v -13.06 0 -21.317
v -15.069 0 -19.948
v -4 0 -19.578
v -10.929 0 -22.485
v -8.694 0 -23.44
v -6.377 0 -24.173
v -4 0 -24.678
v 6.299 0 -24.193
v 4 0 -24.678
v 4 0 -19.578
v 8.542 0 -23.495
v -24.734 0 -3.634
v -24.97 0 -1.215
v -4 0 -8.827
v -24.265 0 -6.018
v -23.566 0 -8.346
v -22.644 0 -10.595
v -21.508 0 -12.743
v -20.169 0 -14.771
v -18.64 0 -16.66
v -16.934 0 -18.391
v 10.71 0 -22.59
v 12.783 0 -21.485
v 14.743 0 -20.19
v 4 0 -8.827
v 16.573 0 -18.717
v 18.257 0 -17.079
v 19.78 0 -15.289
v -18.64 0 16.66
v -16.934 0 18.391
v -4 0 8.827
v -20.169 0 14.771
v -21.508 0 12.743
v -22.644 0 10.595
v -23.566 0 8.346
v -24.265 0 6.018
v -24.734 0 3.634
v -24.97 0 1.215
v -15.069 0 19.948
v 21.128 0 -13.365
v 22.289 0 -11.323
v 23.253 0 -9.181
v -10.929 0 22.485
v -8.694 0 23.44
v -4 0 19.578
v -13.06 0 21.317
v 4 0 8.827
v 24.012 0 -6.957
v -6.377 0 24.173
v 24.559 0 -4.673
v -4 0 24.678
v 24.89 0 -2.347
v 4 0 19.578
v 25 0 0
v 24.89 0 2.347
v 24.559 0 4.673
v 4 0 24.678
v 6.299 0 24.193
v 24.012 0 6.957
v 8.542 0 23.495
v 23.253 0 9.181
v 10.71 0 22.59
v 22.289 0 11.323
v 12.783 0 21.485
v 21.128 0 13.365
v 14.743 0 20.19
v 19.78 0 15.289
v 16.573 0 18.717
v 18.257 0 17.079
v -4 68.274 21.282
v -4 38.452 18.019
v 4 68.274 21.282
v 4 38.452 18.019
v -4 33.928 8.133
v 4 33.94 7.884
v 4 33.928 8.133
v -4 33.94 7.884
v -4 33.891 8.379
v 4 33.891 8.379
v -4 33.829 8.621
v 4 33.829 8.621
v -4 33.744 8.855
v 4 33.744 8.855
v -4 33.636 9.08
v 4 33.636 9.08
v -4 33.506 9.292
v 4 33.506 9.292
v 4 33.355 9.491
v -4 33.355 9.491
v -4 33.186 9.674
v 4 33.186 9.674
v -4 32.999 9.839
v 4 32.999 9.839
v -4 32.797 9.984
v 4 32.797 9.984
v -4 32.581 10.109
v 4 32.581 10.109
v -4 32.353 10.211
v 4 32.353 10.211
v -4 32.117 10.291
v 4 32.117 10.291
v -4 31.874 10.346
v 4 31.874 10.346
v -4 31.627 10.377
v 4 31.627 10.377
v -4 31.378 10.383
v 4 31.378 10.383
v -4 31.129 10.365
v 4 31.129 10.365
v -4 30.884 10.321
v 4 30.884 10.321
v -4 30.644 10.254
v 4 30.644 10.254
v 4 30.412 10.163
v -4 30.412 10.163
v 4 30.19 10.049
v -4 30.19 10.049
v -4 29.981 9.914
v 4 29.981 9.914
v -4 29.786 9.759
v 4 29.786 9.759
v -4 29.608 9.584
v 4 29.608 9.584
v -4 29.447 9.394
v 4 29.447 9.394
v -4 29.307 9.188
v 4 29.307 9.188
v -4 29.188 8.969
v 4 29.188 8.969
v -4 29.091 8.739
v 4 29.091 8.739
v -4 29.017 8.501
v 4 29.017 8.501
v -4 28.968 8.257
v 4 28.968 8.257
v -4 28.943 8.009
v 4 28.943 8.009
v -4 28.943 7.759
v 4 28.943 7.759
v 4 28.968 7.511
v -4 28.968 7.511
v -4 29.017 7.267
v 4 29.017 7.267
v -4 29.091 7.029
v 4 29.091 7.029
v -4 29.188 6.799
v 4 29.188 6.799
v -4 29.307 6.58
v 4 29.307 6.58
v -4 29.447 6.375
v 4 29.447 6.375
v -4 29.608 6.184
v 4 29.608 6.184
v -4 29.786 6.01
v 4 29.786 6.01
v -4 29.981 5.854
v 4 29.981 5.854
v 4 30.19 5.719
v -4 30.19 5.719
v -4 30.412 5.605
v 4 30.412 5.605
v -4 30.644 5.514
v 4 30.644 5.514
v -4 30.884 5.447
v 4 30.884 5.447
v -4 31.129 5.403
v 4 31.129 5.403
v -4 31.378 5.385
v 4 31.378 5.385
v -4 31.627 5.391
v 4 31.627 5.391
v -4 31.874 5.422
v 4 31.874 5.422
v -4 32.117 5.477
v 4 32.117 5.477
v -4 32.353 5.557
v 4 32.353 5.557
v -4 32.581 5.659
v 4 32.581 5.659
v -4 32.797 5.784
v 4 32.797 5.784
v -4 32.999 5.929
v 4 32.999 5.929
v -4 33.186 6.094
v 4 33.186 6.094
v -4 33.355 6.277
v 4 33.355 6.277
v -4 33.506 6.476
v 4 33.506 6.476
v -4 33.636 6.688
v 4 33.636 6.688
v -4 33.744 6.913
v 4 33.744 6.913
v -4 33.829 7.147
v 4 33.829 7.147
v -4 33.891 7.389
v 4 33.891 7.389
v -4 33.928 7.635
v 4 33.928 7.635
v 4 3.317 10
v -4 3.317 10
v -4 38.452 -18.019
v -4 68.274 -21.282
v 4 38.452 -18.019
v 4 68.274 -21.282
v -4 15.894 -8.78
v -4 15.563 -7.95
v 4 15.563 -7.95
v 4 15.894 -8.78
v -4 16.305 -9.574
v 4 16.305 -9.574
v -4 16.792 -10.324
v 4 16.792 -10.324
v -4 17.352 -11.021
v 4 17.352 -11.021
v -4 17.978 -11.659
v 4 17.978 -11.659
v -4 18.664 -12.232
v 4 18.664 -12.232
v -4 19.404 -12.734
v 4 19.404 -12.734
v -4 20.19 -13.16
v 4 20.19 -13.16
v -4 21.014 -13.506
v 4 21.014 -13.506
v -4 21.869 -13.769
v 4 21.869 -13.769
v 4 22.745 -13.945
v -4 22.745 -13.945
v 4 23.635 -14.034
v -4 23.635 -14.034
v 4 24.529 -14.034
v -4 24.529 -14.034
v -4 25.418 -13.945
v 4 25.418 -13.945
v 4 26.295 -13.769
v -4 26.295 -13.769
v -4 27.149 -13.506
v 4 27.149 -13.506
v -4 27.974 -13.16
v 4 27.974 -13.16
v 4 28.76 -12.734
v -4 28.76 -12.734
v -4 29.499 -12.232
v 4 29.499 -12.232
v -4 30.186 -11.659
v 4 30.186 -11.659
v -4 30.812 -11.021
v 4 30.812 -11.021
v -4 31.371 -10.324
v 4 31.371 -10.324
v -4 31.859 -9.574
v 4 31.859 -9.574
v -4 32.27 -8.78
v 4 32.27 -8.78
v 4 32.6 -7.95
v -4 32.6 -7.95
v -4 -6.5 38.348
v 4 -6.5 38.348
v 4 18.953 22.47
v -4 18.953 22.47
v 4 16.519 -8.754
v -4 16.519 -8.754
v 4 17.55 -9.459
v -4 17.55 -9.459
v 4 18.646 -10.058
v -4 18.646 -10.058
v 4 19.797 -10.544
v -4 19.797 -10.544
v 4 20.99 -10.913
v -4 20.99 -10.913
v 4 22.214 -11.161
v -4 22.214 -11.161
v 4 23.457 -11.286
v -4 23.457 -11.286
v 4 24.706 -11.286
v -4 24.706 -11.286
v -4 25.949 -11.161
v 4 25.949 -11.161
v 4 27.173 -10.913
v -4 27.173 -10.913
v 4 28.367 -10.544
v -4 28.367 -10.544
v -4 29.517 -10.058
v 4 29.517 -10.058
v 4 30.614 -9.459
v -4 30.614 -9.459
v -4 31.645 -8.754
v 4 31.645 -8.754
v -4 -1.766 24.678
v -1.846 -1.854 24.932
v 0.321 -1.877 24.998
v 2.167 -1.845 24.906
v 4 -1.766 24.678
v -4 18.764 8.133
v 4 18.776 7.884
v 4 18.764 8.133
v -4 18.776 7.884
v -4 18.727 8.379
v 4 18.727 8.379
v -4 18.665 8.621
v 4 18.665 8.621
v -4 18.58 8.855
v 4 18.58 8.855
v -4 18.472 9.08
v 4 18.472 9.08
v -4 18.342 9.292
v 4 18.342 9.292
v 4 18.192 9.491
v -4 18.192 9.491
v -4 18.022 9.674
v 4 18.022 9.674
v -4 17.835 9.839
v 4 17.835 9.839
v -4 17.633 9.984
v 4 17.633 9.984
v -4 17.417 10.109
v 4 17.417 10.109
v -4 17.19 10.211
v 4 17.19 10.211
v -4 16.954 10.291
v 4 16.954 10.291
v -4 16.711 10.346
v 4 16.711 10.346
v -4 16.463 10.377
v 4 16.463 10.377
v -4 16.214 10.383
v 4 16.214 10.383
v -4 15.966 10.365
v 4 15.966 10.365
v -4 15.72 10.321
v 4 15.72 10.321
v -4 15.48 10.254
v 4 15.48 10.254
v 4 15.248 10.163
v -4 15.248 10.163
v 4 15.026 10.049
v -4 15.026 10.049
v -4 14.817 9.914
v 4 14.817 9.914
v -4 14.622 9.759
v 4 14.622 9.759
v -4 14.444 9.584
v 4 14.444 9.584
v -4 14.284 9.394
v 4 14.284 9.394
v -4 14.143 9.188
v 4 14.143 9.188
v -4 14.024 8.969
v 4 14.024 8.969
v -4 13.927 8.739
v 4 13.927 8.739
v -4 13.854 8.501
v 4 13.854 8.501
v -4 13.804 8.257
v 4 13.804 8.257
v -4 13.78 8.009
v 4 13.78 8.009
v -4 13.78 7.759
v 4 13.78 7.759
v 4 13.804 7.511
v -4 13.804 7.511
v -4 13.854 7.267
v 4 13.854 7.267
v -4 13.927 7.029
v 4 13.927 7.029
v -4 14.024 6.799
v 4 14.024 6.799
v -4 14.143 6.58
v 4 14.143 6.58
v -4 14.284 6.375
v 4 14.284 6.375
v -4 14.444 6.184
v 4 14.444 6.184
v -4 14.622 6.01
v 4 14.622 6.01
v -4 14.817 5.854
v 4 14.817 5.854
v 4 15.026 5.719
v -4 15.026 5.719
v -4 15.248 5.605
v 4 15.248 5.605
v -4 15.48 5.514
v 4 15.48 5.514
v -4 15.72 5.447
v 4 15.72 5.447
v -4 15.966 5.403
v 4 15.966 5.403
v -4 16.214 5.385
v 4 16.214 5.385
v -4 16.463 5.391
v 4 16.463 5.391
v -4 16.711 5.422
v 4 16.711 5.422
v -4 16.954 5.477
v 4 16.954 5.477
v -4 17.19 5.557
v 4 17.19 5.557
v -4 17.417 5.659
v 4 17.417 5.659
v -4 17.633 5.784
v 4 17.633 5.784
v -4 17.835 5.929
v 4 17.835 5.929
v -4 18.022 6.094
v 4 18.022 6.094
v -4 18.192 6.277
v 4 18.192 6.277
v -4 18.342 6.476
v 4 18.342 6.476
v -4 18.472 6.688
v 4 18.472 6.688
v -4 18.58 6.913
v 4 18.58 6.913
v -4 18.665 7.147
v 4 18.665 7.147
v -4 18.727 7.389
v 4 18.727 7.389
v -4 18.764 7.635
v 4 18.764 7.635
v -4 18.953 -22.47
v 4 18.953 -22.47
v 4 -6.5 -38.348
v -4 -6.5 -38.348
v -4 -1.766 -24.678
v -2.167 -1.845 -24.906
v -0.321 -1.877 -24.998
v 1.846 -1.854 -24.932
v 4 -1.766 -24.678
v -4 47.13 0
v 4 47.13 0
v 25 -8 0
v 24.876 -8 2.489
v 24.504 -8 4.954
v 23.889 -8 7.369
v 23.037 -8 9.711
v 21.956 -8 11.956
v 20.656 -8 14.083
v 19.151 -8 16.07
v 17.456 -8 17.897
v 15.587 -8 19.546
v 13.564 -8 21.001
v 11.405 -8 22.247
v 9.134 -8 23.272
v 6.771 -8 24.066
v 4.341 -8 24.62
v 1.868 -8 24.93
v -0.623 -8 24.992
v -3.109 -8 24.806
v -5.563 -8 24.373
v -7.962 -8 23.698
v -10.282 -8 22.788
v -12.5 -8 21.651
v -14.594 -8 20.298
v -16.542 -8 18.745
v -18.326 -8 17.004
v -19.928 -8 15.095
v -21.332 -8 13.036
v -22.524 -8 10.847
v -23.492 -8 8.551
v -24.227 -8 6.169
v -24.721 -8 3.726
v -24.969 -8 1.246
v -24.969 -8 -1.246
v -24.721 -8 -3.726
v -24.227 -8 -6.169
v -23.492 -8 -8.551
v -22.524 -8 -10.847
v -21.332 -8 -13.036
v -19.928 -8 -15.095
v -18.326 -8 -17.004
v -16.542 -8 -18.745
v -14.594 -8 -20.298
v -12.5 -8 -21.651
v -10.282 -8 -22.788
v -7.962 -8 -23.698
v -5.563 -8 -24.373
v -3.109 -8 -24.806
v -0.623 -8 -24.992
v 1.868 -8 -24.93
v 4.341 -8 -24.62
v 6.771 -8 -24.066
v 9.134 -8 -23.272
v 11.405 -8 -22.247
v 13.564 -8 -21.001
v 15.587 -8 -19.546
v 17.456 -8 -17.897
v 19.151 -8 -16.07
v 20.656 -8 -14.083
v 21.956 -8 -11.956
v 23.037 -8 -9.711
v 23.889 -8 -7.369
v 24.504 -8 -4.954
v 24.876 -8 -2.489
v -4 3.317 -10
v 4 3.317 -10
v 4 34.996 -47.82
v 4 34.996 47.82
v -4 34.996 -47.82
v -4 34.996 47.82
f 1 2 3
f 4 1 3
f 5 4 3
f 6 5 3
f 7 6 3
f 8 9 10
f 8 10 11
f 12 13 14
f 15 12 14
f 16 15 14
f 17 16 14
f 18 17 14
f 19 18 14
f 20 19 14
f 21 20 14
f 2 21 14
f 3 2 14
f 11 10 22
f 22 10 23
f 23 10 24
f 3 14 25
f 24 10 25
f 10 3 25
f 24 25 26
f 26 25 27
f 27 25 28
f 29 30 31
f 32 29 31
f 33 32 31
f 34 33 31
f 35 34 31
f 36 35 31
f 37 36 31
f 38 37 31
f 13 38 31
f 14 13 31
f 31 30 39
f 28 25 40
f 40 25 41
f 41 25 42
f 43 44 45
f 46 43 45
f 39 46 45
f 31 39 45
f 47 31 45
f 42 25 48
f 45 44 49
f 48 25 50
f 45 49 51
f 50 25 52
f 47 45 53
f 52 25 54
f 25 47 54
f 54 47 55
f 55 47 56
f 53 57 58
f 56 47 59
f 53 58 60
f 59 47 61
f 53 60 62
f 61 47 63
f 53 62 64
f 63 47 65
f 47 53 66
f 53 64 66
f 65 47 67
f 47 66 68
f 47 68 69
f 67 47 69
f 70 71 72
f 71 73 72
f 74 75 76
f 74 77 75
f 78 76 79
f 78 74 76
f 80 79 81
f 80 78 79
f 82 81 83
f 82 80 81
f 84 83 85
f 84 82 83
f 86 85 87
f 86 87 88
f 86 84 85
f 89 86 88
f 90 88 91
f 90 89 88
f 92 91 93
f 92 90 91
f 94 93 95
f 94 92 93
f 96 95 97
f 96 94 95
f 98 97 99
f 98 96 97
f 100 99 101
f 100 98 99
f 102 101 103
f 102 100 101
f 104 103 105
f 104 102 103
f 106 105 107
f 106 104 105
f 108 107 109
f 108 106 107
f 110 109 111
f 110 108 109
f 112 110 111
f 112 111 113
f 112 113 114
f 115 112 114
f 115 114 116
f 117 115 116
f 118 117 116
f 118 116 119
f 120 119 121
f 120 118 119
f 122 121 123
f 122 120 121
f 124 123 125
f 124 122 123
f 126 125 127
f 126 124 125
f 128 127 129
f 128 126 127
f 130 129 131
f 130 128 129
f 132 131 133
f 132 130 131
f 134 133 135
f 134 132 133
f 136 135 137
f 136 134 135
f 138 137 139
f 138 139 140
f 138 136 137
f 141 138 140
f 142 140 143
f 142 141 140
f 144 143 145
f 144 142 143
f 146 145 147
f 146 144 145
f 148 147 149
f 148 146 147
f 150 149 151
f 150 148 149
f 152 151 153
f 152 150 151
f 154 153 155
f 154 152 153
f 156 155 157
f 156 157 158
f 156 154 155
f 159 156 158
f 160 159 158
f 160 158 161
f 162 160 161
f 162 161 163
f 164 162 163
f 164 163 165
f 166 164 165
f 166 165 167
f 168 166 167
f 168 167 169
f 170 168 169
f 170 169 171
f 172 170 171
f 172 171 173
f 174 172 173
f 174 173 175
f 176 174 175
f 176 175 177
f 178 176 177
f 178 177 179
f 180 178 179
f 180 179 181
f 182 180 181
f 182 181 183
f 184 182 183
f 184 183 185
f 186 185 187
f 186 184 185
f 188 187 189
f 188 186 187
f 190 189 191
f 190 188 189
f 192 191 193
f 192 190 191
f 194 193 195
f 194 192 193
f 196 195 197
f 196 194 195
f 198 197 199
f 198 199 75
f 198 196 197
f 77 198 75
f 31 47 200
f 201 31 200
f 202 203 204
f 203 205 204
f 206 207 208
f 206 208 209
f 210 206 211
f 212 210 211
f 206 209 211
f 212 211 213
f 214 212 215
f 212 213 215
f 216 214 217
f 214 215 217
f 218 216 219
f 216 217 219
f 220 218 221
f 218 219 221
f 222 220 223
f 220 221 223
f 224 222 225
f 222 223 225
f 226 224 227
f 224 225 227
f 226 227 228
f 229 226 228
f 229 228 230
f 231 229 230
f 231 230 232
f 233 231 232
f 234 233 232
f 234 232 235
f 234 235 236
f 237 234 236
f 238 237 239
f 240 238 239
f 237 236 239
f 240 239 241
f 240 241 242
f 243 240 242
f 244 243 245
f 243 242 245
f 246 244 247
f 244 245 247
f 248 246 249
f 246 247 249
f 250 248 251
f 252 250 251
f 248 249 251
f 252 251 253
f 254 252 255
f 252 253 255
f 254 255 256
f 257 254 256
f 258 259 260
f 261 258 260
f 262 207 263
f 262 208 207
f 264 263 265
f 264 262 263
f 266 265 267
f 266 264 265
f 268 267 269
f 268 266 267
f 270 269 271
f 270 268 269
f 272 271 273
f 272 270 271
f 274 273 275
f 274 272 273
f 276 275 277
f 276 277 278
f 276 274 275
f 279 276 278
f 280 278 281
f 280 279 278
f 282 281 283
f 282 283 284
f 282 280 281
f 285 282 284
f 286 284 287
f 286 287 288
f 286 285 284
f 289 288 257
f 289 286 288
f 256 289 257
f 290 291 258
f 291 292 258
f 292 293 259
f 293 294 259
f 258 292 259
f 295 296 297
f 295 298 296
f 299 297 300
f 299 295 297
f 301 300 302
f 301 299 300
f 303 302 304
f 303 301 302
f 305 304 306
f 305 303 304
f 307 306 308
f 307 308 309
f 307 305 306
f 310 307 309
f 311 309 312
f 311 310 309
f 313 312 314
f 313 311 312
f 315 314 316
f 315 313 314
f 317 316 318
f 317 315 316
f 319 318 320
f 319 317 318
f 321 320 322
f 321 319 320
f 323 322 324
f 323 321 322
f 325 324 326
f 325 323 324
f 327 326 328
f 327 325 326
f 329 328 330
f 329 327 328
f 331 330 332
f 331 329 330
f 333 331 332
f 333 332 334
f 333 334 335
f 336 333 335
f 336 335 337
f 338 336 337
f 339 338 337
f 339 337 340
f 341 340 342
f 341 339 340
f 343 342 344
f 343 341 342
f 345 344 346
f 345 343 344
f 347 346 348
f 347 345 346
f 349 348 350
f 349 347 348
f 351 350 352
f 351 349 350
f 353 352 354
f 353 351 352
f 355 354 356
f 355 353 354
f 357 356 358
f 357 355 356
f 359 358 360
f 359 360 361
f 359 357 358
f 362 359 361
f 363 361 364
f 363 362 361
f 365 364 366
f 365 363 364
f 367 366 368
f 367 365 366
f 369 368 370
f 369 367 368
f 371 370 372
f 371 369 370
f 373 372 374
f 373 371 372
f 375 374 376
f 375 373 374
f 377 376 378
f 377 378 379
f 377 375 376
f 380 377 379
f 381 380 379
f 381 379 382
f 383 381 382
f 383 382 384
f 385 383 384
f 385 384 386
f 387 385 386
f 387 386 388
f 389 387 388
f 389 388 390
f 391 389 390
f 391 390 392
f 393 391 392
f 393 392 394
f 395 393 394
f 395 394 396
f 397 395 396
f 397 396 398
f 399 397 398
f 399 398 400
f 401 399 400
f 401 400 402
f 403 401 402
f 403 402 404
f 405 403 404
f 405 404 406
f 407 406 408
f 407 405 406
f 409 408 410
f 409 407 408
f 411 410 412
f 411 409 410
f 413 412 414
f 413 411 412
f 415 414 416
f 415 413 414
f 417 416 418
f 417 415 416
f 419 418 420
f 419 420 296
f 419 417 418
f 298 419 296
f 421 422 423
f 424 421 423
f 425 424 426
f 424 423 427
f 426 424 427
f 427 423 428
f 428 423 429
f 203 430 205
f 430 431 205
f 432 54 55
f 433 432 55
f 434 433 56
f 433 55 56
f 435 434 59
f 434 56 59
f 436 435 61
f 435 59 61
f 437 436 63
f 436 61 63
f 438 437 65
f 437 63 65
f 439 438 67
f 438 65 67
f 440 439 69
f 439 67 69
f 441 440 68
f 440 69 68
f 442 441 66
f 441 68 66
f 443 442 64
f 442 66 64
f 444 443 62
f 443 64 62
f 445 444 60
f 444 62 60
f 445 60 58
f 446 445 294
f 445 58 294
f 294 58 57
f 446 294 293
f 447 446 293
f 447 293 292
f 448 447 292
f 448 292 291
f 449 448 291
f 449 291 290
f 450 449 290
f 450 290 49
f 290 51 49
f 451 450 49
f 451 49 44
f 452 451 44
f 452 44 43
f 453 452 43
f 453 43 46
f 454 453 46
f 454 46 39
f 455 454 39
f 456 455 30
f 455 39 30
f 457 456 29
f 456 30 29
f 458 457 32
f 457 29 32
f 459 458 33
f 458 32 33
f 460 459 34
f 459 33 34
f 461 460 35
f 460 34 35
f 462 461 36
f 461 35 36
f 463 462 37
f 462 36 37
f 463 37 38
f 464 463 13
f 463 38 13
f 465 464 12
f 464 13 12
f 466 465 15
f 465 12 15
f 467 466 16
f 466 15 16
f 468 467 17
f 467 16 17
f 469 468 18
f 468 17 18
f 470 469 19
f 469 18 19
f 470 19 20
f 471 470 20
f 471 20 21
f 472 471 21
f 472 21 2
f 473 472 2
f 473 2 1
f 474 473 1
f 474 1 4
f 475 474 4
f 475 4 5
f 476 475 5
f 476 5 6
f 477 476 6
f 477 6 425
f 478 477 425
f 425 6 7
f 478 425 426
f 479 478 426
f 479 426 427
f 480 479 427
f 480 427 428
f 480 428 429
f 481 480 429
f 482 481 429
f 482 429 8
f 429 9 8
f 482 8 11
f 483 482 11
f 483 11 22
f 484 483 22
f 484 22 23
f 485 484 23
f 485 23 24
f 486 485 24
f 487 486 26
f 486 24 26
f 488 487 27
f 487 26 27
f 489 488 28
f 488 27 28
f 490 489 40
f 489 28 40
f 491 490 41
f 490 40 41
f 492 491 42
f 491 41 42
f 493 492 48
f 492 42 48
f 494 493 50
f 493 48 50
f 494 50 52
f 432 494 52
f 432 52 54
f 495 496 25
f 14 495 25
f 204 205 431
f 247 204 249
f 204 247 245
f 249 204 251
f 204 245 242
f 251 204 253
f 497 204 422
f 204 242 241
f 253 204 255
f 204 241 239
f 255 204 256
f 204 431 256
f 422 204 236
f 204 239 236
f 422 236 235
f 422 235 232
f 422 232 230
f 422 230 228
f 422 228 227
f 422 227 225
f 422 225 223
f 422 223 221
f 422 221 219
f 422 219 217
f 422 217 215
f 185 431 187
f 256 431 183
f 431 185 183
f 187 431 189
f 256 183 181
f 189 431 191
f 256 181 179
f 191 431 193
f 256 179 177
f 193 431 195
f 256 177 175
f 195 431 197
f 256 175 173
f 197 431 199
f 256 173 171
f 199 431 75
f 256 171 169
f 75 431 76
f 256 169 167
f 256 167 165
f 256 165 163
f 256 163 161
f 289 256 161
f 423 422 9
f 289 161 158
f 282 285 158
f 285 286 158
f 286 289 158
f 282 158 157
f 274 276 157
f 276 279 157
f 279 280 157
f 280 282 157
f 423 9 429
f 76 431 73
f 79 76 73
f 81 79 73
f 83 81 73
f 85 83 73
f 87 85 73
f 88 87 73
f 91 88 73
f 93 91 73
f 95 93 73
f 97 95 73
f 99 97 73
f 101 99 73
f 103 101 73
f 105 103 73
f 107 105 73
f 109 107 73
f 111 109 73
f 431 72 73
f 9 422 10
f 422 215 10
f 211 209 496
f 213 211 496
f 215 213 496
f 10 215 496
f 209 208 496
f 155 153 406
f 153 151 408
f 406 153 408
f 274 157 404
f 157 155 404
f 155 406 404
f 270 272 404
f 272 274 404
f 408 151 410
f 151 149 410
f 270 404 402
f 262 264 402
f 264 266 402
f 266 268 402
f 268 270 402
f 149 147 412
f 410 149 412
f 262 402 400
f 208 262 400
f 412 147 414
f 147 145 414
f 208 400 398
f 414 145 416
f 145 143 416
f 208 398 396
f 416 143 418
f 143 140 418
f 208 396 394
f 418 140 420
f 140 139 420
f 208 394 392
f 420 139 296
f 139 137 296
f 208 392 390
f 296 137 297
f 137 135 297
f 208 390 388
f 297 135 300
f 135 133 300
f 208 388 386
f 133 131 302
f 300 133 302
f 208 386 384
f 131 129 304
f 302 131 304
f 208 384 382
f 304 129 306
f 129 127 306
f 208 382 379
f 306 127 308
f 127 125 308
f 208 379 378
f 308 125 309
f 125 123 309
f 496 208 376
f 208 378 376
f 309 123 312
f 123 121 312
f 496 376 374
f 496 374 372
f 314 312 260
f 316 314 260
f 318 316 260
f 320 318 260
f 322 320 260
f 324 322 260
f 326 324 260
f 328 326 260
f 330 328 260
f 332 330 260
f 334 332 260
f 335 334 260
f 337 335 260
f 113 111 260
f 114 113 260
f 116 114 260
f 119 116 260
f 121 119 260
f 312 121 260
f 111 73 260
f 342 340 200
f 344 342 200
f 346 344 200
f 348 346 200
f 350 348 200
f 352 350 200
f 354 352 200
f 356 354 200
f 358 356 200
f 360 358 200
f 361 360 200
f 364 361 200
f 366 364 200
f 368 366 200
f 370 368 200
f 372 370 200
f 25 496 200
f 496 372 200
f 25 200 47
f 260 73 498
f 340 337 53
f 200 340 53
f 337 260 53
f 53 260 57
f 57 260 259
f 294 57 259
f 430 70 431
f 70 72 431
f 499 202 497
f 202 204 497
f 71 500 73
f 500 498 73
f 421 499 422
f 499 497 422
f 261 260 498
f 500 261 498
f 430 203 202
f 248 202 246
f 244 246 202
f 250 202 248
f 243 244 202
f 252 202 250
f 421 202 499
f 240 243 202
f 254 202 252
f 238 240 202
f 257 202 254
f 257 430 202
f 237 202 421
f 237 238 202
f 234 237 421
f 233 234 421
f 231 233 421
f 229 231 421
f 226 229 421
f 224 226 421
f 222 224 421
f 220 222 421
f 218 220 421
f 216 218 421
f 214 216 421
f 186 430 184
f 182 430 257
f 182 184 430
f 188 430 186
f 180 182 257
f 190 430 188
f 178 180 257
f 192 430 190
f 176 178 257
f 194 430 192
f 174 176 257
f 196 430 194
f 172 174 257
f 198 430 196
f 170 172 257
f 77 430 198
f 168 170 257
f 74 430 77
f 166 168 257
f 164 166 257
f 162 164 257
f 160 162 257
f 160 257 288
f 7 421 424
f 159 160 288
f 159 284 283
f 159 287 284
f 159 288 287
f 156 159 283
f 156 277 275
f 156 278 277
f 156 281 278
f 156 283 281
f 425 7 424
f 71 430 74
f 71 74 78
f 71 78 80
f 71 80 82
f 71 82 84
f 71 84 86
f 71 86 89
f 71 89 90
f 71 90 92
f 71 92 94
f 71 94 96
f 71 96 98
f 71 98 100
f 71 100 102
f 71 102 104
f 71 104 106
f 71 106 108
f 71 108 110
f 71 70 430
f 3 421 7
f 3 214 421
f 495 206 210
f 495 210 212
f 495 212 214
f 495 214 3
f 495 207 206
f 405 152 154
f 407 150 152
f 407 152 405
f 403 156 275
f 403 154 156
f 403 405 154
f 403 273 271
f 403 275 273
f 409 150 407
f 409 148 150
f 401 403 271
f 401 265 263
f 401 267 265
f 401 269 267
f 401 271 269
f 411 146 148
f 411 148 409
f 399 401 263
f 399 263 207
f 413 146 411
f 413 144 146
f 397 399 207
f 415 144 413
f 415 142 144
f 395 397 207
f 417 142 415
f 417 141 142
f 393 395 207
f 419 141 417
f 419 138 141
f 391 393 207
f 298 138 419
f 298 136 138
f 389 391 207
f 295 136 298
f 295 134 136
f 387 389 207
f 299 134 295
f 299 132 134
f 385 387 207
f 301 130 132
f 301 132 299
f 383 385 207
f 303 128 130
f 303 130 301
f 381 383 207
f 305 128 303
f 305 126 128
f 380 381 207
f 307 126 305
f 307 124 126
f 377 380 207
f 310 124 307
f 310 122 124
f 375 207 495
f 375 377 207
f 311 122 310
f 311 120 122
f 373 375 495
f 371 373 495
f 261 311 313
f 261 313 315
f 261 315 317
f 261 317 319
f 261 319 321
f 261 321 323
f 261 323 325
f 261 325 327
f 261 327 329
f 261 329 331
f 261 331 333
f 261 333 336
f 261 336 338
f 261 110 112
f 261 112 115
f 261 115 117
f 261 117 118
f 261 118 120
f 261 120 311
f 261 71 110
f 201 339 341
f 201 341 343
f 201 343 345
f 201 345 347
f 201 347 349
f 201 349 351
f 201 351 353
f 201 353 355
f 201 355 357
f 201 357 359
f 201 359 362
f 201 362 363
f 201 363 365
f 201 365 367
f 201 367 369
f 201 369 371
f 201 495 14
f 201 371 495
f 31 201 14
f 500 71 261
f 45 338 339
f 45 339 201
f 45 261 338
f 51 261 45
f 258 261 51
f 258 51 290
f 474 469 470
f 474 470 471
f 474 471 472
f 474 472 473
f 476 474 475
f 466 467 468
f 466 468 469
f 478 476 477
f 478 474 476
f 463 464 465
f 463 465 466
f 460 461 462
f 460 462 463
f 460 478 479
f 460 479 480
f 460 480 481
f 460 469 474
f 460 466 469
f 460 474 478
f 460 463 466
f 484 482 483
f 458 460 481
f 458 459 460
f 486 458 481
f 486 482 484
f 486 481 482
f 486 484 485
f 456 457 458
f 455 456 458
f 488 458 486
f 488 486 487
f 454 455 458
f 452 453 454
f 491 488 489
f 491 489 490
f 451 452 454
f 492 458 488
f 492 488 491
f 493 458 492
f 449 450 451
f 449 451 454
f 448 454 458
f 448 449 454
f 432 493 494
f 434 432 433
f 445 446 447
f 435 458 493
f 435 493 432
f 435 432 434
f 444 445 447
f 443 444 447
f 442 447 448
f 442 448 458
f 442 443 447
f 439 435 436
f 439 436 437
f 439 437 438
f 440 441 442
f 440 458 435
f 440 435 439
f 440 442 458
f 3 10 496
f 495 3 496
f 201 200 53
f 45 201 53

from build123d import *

# Parameters (mm, degrees)
SKETCH_R     = 25
PAD_DEPTH    = 8
SKETCH001_R  = 2.5
PAD001_DEPTH = 4


with BuildPart() as part:
    # Sketch → Pad (new body)
    with BuildSketch(Plane.XZ):
        Circle(SKETCH_R)
    extrude(amount=PAD_DEPTH)

    # Sketch001 → Pad001 (join, symmetric)
    with BuildSketch(Plane.YZ):
        Polygon((18.95327, 22.469796), (34.996391, 47.819712), (38.451828, 18.019377), (68.273913, 21.281774), (47.129503, 0), (68.273913, -21.281774), (38.451828, -18.019377), (34.996391, -47.819712), (18.95327, -22.469796), (-6.5, -38.348432), (3.31664, -10), (0, -8.827391), (0, 8.827391), (3.31664, 10), (-6.5, 38.348432), align=None)
        with Locations((16.276457, 7.884052)):
            Circle(SKETCH001_R, mode=Mode.SUBTRACT)
        with Locations((31.440147, 7.884052)):
            Circle(SKETCH001_R, mode=Mode.SUBTRACT)
        with BuildLine():
            ThreePointArc((15.563428, -7.94964), (24.081854, -14.045087), (32.600279, -7.94964))
            ThreePointArc((15.563428, -7.94964), (24.081854, -11.301611), (32.600279, -7.94964))
        make_face(mode=Mode.SUBTRACT)
    extrude(amount=PAD001_DEPTH, both=True)


solid = part.part
